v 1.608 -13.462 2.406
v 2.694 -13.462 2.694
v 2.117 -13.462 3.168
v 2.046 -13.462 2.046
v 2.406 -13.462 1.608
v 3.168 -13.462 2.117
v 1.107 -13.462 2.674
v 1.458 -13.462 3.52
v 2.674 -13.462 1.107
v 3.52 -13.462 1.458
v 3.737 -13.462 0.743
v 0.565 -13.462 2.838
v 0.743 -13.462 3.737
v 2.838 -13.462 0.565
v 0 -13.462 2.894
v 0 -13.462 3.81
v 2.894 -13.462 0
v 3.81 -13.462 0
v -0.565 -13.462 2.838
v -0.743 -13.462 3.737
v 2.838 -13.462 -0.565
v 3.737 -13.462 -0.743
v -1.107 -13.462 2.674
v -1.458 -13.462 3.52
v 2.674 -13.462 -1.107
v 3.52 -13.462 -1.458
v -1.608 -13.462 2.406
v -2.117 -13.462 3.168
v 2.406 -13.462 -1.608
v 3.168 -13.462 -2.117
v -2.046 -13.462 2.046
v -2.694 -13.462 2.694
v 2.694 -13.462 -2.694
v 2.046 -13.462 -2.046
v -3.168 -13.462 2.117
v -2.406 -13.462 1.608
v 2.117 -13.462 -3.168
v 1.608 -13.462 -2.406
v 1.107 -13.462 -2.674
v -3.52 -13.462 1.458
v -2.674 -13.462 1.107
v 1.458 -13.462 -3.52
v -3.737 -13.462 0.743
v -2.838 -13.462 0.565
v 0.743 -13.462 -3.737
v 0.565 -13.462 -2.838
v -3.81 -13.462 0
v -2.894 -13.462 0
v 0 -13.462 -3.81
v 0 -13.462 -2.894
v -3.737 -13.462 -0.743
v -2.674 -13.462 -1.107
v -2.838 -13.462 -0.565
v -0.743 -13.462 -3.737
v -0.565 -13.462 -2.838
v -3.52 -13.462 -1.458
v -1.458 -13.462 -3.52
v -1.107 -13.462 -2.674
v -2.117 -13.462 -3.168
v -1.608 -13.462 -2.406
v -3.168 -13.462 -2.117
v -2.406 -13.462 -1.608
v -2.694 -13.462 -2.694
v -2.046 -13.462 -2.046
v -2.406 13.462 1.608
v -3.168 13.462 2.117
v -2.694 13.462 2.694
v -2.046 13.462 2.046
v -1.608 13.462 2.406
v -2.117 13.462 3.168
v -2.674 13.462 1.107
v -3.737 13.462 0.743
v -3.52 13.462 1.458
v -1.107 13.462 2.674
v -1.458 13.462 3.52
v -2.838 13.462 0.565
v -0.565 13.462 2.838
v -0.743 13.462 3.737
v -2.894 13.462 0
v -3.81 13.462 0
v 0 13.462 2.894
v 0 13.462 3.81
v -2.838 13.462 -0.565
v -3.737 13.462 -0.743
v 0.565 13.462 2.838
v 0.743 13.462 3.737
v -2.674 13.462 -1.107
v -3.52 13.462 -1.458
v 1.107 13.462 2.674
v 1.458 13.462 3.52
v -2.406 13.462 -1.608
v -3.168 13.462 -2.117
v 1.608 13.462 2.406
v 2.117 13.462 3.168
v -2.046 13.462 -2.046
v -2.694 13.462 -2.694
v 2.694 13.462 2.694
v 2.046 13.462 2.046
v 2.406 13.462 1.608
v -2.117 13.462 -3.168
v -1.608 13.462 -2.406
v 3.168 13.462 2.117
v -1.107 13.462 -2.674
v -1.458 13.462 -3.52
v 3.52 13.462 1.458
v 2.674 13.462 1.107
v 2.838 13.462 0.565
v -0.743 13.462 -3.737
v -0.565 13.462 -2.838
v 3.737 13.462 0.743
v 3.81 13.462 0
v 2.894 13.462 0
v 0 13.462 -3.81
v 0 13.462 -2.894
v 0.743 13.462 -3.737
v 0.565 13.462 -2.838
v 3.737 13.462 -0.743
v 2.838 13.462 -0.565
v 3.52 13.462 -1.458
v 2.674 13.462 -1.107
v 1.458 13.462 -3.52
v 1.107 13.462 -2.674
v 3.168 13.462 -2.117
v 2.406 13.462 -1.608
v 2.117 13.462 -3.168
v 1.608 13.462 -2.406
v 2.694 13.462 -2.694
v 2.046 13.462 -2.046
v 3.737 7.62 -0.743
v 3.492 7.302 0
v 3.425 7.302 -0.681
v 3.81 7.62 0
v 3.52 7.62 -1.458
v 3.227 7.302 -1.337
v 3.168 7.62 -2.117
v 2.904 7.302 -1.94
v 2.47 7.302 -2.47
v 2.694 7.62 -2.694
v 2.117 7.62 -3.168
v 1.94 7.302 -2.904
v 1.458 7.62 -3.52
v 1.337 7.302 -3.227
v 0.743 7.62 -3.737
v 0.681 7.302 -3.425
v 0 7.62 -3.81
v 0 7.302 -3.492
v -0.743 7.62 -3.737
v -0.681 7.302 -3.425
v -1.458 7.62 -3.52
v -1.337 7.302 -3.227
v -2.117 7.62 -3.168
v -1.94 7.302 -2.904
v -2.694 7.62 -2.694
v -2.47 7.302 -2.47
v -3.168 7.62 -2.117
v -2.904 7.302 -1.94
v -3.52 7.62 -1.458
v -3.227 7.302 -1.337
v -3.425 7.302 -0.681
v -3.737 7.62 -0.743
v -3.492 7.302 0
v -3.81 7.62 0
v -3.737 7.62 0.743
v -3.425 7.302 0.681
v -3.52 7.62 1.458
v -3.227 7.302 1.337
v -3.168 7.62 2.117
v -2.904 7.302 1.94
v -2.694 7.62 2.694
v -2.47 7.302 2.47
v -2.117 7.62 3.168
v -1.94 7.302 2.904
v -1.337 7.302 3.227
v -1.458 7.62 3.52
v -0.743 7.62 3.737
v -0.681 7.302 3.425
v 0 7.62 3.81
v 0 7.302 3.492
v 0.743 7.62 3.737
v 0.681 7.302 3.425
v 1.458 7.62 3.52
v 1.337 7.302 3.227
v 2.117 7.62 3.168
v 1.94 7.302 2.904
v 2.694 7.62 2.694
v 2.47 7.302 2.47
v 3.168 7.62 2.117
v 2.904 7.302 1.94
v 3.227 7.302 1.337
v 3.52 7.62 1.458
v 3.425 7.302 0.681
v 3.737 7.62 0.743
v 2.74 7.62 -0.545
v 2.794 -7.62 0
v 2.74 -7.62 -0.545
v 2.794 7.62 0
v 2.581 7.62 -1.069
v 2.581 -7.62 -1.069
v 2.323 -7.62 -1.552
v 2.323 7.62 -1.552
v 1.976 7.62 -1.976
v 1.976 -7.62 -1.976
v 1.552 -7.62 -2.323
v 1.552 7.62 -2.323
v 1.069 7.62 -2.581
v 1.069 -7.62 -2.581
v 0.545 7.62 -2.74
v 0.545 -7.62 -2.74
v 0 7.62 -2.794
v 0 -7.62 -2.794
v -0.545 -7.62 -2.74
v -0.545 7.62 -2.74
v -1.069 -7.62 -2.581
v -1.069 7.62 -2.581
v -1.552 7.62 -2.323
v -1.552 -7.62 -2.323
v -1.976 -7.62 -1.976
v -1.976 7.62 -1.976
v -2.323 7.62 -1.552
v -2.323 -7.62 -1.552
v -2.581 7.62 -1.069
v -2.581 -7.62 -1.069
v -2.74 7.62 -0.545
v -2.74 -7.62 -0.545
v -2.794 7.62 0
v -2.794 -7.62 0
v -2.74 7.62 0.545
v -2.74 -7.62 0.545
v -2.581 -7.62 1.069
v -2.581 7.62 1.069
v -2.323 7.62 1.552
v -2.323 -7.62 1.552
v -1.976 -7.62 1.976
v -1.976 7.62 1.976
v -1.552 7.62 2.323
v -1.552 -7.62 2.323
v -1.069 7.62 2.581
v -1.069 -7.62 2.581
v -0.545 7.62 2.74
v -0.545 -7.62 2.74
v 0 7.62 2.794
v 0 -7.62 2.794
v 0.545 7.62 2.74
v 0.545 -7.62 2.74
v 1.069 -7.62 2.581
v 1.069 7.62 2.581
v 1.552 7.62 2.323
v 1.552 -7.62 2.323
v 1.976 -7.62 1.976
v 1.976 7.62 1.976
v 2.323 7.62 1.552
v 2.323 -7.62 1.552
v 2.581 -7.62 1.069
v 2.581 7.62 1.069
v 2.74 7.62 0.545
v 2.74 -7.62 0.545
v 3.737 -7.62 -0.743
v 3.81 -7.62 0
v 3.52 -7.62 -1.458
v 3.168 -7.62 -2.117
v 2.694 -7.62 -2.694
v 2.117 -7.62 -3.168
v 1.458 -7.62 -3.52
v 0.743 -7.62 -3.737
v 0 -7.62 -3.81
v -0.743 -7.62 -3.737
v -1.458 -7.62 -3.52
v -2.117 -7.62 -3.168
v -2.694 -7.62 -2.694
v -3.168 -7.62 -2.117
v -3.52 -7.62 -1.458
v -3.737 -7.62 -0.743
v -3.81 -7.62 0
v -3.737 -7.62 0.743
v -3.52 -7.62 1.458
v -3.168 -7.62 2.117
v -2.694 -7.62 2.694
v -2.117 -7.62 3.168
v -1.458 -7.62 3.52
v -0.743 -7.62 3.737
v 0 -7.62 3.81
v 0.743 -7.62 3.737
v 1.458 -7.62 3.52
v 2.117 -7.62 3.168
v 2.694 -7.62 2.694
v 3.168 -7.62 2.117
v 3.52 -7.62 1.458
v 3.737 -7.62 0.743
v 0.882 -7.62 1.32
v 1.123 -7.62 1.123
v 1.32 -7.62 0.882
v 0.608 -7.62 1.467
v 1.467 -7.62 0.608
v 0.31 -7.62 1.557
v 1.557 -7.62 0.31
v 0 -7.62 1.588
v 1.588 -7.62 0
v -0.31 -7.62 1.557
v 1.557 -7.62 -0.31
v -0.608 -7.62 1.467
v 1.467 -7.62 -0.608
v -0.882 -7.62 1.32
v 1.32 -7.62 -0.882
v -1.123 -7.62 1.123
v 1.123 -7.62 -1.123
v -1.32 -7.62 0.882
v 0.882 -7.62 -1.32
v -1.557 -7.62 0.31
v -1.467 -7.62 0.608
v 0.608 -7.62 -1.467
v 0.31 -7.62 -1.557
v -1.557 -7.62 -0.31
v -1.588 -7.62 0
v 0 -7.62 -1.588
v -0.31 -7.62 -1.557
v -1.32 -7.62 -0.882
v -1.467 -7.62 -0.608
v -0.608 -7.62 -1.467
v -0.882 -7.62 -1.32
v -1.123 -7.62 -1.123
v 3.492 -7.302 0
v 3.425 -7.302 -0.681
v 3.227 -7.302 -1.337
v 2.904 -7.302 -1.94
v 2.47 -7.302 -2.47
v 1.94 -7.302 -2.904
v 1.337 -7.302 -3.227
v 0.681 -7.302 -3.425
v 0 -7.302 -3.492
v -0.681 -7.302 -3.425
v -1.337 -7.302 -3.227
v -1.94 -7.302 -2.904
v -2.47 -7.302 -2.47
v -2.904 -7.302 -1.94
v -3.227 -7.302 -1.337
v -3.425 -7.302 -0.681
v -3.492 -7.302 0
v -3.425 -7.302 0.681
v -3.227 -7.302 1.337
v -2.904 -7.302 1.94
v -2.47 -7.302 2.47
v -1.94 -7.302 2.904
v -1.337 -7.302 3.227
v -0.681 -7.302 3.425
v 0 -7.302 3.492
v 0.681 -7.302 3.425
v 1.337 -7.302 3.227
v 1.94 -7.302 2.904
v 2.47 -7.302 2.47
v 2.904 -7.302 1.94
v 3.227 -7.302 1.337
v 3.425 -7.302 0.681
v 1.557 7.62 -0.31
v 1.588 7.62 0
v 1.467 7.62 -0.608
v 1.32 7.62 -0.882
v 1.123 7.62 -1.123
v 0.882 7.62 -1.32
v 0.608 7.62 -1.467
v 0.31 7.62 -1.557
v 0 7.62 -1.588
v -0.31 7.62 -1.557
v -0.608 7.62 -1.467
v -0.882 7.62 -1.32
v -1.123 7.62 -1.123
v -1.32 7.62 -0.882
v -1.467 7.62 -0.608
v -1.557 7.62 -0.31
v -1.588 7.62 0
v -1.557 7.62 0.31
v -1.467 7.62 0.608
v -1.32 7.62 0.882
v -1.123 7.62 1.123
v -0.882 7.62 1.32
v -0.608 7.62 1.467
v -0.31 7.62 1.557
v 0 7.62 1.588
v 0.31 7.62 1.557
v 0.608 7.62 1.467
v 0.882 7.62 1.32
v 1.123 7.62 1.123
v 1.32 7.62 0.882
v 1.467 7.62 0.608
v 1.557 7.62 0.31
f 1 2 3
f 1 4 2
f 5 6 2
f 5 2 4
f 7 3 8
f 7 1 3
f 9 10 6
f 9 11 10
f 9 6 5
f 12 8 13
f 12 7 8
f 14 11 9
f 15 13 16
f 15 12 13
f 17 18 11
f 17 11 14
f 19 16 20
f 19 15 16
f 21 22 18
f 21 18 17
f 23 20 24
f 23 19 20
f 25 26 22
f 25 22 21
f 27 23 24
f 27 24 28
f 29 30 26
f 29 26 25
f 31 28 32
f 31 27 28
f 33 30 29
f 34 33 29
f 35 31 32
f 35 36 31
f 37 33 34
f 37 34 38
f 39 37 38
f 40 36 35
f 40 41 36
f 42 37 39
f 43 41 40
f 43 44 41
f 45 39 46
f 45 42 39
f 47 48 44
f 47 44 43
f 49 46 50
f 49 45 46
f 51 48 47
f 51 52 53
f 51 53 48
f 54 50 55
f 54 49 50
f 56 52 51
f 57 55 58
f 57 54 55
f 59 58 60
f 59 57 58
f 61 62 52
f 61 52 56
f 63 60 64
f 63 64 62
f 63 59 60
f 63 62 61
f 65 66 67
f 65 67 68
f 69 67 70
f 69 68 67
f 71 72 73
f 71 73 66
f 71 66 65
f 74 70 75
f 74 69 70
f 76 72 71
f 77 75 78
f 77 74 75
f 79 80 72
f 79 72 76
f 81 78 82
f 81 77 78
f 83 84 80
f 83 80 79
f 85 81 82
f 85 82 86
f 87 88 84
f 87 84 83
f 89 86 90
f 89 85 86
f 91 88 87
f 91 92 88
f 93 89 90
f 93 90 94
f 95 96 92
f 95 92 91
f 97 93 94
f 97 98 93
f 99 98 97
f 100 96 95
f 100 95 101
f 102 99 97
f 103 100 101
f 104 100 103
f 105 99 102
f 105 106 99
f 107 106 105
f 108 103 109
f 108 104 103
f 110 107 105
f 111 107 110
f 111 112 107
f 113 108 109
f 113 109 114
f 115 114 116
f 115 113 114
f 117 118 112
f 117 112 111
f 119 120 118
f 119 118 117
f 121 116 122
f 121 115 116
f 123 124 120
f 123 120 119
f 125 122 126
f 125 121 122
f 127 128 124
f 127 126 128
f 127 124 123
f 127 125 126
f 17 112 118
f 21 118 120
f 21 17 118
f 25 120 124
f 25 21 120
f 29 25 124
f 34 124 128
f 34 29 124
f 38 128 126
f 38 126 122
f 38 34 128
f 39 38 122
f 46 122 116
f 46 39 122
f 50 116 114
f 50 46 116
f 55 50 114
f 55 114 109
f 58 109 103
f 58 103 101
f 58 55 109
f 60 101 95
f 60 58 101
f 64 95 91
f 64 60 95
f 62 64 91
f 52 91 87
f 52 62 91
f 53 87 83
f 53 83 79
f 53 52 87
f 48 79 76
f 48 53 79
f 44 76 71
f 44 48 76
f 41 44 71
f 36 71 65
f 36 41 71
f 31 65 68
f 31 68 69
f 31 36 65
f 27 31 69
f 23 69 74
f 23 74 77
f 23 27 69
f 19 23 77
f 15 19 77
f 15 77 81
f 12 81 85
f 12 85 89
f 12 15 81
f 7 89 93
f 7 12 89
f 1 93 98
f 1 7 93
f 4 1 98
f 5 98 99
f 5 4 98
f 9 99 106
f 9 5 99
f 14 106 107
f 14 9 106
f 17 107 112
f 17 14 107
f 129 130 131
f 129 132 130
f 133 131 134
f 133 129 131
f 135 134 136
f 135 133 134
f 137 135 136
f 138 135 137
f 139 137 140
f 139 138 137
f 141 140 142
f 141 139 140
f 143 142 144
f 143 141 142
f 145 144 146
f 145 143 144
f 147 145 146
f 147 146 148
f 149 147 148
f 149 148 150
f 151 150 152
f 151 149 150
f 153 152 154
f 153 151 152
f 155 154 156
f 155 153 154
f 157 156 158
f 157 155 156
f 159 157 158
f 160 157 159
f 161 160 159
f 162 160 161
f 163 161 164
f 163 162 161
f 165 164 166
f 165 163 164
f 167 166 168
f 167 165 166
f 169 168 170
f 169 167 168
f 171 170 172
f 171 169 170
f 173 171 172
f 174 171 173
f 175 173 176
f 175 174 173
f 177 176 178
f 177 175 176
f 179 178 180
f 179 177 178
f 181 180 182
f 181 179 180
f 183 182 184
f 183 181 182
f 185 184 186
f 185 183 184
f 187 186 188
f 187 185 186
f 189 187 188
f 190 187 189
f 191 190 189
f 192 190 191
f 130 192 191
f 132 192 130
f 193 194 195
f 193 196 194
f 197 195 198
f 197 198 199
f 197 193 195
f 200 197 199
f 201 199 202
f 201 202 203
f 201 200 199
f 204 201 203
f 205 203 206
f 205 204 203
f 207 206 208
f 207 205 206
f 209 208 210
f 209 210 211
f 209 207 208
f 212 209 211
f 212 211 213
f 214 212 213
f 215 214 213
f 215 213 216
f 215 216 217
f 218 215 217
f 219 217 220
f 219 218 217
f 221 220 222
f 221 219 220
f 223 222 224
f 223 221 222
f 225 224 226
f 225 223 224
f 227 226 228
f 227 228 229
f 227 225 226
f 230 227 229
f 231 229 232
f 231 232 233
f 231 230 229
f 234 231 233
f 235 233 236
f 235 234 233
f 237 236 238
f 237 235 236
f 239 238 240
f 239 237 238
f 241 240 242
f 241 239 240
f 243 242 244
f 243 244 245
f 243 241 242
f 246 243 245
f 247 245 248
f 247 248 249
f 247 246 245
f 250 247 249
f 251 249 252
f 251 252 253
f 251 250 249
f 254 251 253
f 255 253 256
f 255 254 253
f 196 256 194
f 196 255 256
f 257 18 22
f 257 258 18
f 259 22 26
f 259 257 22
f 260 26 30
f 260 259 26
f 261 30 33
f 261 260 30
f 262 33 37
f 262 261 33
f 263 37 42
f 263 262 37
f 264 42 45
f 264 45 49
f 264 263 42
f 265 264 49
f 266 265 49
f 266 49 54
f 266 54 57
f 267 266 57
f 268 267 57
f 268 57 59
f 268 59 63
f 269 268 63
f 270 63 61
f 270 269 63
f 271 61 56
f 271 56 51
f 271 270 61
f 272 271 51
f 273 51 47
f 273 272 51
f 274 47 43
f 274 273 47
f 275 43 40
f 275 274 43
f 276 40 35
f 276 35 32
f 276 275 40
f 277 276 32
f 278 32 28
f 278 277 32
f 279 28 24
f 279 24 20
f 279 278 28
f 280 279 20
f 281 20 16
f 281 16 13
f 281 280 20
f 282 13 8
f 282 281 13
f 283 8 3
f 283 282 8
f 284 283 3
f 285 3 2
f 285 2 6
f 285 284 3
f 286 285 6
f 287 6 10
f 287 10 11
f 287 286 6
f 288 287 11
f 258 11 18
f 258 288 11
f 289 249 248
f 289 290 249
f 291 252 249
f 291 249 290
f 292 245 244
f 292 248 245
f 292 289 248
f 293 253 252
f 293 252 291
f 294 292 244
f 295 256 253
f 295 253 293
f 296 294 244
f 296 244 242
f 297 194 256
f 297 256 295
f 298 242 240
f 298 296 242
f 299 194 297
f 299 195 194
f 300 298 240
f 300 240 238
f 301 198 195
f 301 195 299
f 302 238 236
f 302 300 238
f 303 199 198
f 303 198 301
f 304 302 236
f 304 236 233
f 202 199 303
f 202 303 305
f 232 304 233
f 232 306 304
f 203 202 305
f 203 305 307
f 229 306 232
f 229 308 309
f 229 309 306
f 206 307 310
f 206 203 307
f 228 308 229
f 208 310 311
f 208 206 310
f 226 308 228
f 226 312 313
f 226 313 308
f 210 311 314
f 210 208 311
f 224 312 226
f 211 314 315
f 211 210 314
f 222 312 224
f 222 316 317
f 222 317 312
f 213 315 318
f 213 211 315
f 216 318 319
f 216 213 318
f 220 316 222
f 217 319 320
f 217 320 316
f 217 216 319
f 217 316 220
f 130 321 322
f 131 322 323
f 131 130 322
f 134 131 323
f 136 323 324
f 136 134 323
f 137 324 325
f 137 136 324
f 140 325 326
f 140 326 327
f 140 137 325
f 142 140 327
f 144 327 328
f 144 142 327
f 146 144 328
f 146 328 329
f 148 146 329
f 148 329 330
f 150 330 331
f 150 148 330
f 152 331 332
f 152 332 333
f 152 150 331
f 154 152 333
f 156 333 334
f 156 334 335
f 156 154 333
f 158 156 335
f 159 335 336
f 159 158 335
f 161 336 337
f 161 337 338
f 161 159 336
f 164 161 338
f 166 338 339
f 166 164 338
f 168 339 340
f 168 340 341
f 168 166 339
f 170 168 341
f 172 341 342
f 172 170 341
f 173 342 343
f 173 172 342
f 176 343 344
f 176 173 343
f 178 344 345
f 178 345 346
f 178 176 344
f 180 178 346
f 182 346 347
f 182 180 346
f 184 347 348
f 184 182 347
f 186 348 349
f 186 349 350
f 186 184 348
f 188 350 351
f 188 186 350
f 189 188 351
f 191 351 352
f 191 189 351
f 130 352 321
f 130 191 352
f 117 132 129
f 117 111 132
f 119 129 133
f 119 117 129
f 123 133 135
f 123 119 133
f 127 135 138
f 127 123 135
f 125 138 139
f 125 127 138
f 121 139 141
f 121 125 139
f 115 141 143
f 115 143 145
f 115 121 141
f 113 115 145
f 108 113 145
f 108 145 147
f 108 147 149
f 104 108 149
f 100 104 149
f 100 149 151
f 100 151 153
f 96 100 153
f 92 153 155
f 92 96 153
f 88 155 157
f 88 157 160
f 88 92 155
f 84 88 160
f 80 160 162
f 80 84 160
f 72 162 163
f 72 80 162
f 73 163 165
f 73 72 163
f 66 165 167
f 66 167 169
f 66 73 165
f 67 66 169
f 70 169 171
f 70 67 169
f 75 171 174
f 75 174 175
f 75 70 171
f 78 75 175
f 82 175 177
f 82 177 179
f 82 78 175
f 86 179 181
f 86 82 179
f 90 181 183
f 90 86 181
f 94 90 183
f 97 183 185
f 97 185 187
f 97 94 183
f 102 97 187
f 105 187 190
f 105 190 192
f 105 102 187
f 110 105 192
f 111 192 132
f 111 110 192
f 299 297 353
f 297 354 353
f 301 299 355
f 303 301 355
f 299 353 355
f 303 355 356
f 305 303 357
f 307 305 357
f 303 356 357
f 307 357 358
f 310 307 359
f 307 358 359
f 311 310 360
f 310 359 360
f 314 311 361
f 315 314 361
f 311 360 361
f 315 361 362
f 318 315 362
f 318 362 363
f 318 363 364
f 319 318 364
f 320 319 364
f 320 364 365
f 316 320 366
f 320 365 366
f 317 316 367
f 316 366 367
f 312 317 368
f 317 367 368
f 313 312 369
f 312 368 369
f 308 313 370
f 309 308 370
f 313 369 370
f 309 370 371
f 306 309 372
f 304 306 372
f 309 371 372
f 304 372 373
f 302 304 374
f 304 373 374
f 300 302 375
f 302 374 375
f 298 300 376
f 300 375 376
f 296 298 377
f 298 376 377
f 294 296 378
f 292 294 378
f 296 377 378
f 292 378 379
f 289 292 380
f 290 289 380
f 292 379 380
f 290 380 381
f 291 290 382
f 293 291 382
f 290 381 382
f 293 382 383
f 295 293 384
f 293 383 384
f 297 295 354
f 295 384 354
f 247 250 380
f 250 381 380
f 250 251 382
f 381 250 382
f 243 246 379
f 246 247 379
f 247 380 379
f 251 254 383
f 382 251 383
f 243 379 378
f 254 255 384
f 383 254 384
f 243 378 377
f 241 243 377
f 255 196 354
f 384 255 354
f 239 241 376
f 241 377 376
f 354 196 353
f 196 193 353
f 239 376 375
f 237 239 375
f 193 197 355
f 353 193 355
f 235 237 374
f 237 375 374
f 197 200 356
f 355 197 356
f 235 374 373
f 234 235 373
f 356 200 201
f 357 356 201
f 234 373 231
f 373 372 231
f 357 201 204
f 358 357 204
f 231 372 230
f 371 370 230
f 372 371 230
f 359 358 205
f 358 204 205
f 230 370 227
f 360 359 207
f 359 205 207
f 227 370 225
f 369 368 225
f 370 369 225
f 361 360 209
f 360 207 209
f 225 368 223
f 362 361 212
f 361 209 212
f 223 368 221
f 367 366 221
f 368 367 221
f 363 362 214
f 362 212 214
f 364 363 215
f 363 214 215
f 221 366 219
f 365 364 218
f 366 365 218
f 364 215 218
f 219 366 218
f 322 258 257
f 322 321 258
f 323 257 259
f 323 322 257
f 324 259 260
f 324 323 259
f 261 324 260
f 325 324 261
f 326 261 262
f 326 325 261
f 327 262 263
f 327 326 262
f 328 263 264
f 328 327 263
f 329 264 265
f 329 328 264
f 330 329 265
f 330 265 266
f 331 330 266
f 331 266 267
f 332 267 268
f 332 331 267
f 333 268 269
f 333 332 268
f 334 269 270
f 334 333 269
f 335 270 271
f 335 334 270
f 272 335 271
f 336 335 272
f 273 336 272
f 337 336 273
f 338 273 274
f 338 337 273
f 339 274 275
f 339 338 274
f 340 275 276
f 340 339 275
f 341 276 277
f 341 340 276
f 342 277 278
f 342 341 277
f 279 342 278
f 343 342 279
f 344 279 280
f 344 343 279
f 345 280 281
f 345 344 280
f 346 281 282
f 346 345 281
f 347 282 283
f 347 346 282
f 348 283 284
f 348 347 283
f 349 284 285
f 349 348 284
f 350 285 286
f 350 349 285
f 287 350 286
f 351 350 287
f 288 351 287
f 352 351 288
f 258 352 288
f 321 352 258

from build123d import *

# Parameters (mm, degrees)
SKETCH1_W = 1.2065
SKETCH1_H = 15.24


with BuildPart() as part:
    # Sketch1 → Revolve1 (revolve)
    with BuildSketch(Plane.XY):
        Polygon((2.894, 13.462), (2.894, -13.462), (3.81, -13.462), (3.81, -7.62), (3.4925, -7.3025), (3.4925, 7.3025), (3.81, 7.62), (3.81, 13.462), align=None)
        with Locations((2.19075, 0)):
            Rectangle(SKETCH1_W, SKETCH1_H)
    revolve(axis=Axis((0, 0, 0), (0, 1, 0)))


solid = part.part
